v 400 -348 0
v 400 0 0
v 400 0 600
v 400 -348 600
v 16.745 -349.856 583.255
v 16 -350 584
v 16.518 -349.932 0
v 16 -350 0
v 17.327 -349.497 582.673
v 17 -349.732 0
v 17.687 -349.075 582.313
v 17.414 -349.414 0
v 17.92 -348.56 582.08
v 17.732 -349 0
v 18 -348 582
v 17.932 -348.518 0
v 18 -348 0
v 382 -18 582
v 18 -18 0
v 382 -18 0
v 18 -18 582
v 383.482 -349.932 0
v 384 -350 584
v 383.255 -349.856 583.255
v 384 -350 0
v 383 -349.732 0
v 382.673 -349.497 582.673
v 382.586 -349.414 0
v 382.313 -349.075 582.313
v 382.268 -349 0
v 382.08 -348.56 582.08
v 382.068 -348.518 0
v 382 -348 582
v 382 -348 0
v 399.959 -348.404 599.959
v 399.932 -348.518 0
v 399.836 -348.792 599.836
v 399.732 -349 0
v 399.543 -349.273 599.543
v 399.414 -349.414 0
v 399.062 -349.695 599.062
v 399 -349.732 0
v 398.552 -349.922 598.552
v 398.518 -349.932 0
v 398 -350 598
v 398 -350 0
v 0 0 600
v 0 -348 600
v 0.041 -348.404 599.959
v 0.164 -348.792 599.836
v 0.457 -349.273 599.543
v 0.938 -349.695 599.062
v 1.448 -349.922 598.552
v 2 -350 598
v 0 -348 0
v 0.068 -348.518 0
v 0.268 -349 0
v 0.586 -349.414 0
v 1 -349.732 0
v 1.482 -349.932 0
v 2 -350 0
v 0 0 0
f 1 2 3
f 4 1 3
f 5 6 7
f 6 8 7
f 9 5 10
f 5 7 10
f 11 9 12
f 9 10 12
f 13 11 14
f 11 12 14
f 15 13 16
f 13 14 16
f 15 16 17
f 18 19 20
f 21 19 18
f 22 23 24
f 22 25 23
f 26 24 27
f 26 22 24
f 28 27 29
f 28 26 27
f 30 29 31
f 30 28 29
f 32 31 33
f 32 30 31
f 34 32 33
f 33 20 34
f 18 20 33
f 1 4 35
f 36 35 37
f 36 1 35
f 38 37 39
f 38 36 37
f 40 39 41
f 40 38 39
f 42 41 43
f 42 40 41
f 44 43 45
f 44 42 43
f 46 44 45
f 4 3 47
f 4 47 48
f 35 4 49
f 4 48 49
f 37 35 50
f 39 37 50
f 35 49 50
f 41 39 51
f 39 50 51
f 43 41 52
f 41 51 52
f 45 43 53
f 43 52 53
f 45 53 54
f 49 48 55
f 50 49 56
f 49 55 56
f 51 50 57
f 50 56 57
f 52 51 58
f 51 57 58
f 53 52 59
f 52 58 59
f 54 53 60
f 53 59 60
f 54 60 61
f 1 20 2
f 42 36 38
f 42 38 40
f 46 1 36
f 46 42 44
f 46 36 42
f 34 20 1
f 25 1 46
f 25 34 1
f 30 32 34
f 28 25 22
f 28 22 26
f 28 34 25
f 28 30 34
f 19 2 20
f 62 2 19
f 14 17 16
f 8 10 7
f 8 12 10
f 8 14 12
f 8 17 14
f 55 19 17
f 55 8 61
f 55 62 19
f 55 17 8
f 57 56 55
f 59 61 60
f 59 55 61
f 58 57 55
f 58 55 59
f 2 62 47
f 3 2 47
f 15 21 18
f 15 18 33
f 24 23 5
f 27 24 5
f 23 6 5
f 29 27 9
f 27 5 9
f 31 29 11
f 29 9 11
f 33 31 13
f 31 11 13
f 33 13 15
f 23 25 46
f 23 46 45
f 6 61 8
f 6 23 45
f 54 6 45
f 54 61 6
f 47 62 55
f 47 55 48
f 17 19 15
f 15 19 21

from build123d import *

# Parameters (mm, degrees)
F0_W     = 48.4505593777
F0_H     = 45.2879294753
F1_DEPTH = 350
F2_DEPTH = 18
F3_DEPTH = 600
F4_DEPTH = 400
F5_T     = -18
F6_R     = 2
F7_R     = 2


with BuildPart() as f1:
    # F0 (on Front) → F1 (new body)
    with BuildSketch(Plane.XZ):
        with Locations((24.2252796888, 22.6439647377)):
            Rectangle(F0_W, F0_H)
    extrude(amount=F1_DEPTH)

    # F2 (intersect): a face of the model
    f2_faces = [f1.faces().sort_by_distance(p)[0] for p in [
        (0, -175, 22.6439647377),
    ]]
    extrude(f2_faces, amount=-F2_DEPTH, mode=Mode.INTERSECT)

    # F3 (add): a face of the model
    f3_faces = [f1.faces().sort_by_distance(p)[0] for p in [
        (9, -175, 0),
    ]]
    extrude(f3_faces, amount=-F3_DEPTH)

    # F4 (add): a face of the model
    f4_faces = [f1.faces().sort_by_distance(p)[0] for p in [
        (0, -175, 300),
    ]]
    extrude(f4_faces, amount=-F4_DEPTH)

    # F5
    f5_openings = [f1.faces().sort_by_distance(p)[0] for p in [
        (200, -350, 300),
        (200, -175, 0),
    ]]
    offset(amount=F5_T, openings=f5_openings)

    # F6
    f6_edges = [f1.edges().sort_by_distance(p)[0] for p in [
        (400, -350, 300),
        (200, -350, 600),
        (0, -350, 300),
    ]]
    fillet(f6_edges, radius=F6_R)

    # F7
    f7_edges = [f1.edges().sort_by_distance(p)[0] for p in [
        (18, -350, 291),
        (382, -350, 291),
        (200, -350, 582),
    ]]
    fillet(f7_edges, radius=F7_R)


solid = f1.part
